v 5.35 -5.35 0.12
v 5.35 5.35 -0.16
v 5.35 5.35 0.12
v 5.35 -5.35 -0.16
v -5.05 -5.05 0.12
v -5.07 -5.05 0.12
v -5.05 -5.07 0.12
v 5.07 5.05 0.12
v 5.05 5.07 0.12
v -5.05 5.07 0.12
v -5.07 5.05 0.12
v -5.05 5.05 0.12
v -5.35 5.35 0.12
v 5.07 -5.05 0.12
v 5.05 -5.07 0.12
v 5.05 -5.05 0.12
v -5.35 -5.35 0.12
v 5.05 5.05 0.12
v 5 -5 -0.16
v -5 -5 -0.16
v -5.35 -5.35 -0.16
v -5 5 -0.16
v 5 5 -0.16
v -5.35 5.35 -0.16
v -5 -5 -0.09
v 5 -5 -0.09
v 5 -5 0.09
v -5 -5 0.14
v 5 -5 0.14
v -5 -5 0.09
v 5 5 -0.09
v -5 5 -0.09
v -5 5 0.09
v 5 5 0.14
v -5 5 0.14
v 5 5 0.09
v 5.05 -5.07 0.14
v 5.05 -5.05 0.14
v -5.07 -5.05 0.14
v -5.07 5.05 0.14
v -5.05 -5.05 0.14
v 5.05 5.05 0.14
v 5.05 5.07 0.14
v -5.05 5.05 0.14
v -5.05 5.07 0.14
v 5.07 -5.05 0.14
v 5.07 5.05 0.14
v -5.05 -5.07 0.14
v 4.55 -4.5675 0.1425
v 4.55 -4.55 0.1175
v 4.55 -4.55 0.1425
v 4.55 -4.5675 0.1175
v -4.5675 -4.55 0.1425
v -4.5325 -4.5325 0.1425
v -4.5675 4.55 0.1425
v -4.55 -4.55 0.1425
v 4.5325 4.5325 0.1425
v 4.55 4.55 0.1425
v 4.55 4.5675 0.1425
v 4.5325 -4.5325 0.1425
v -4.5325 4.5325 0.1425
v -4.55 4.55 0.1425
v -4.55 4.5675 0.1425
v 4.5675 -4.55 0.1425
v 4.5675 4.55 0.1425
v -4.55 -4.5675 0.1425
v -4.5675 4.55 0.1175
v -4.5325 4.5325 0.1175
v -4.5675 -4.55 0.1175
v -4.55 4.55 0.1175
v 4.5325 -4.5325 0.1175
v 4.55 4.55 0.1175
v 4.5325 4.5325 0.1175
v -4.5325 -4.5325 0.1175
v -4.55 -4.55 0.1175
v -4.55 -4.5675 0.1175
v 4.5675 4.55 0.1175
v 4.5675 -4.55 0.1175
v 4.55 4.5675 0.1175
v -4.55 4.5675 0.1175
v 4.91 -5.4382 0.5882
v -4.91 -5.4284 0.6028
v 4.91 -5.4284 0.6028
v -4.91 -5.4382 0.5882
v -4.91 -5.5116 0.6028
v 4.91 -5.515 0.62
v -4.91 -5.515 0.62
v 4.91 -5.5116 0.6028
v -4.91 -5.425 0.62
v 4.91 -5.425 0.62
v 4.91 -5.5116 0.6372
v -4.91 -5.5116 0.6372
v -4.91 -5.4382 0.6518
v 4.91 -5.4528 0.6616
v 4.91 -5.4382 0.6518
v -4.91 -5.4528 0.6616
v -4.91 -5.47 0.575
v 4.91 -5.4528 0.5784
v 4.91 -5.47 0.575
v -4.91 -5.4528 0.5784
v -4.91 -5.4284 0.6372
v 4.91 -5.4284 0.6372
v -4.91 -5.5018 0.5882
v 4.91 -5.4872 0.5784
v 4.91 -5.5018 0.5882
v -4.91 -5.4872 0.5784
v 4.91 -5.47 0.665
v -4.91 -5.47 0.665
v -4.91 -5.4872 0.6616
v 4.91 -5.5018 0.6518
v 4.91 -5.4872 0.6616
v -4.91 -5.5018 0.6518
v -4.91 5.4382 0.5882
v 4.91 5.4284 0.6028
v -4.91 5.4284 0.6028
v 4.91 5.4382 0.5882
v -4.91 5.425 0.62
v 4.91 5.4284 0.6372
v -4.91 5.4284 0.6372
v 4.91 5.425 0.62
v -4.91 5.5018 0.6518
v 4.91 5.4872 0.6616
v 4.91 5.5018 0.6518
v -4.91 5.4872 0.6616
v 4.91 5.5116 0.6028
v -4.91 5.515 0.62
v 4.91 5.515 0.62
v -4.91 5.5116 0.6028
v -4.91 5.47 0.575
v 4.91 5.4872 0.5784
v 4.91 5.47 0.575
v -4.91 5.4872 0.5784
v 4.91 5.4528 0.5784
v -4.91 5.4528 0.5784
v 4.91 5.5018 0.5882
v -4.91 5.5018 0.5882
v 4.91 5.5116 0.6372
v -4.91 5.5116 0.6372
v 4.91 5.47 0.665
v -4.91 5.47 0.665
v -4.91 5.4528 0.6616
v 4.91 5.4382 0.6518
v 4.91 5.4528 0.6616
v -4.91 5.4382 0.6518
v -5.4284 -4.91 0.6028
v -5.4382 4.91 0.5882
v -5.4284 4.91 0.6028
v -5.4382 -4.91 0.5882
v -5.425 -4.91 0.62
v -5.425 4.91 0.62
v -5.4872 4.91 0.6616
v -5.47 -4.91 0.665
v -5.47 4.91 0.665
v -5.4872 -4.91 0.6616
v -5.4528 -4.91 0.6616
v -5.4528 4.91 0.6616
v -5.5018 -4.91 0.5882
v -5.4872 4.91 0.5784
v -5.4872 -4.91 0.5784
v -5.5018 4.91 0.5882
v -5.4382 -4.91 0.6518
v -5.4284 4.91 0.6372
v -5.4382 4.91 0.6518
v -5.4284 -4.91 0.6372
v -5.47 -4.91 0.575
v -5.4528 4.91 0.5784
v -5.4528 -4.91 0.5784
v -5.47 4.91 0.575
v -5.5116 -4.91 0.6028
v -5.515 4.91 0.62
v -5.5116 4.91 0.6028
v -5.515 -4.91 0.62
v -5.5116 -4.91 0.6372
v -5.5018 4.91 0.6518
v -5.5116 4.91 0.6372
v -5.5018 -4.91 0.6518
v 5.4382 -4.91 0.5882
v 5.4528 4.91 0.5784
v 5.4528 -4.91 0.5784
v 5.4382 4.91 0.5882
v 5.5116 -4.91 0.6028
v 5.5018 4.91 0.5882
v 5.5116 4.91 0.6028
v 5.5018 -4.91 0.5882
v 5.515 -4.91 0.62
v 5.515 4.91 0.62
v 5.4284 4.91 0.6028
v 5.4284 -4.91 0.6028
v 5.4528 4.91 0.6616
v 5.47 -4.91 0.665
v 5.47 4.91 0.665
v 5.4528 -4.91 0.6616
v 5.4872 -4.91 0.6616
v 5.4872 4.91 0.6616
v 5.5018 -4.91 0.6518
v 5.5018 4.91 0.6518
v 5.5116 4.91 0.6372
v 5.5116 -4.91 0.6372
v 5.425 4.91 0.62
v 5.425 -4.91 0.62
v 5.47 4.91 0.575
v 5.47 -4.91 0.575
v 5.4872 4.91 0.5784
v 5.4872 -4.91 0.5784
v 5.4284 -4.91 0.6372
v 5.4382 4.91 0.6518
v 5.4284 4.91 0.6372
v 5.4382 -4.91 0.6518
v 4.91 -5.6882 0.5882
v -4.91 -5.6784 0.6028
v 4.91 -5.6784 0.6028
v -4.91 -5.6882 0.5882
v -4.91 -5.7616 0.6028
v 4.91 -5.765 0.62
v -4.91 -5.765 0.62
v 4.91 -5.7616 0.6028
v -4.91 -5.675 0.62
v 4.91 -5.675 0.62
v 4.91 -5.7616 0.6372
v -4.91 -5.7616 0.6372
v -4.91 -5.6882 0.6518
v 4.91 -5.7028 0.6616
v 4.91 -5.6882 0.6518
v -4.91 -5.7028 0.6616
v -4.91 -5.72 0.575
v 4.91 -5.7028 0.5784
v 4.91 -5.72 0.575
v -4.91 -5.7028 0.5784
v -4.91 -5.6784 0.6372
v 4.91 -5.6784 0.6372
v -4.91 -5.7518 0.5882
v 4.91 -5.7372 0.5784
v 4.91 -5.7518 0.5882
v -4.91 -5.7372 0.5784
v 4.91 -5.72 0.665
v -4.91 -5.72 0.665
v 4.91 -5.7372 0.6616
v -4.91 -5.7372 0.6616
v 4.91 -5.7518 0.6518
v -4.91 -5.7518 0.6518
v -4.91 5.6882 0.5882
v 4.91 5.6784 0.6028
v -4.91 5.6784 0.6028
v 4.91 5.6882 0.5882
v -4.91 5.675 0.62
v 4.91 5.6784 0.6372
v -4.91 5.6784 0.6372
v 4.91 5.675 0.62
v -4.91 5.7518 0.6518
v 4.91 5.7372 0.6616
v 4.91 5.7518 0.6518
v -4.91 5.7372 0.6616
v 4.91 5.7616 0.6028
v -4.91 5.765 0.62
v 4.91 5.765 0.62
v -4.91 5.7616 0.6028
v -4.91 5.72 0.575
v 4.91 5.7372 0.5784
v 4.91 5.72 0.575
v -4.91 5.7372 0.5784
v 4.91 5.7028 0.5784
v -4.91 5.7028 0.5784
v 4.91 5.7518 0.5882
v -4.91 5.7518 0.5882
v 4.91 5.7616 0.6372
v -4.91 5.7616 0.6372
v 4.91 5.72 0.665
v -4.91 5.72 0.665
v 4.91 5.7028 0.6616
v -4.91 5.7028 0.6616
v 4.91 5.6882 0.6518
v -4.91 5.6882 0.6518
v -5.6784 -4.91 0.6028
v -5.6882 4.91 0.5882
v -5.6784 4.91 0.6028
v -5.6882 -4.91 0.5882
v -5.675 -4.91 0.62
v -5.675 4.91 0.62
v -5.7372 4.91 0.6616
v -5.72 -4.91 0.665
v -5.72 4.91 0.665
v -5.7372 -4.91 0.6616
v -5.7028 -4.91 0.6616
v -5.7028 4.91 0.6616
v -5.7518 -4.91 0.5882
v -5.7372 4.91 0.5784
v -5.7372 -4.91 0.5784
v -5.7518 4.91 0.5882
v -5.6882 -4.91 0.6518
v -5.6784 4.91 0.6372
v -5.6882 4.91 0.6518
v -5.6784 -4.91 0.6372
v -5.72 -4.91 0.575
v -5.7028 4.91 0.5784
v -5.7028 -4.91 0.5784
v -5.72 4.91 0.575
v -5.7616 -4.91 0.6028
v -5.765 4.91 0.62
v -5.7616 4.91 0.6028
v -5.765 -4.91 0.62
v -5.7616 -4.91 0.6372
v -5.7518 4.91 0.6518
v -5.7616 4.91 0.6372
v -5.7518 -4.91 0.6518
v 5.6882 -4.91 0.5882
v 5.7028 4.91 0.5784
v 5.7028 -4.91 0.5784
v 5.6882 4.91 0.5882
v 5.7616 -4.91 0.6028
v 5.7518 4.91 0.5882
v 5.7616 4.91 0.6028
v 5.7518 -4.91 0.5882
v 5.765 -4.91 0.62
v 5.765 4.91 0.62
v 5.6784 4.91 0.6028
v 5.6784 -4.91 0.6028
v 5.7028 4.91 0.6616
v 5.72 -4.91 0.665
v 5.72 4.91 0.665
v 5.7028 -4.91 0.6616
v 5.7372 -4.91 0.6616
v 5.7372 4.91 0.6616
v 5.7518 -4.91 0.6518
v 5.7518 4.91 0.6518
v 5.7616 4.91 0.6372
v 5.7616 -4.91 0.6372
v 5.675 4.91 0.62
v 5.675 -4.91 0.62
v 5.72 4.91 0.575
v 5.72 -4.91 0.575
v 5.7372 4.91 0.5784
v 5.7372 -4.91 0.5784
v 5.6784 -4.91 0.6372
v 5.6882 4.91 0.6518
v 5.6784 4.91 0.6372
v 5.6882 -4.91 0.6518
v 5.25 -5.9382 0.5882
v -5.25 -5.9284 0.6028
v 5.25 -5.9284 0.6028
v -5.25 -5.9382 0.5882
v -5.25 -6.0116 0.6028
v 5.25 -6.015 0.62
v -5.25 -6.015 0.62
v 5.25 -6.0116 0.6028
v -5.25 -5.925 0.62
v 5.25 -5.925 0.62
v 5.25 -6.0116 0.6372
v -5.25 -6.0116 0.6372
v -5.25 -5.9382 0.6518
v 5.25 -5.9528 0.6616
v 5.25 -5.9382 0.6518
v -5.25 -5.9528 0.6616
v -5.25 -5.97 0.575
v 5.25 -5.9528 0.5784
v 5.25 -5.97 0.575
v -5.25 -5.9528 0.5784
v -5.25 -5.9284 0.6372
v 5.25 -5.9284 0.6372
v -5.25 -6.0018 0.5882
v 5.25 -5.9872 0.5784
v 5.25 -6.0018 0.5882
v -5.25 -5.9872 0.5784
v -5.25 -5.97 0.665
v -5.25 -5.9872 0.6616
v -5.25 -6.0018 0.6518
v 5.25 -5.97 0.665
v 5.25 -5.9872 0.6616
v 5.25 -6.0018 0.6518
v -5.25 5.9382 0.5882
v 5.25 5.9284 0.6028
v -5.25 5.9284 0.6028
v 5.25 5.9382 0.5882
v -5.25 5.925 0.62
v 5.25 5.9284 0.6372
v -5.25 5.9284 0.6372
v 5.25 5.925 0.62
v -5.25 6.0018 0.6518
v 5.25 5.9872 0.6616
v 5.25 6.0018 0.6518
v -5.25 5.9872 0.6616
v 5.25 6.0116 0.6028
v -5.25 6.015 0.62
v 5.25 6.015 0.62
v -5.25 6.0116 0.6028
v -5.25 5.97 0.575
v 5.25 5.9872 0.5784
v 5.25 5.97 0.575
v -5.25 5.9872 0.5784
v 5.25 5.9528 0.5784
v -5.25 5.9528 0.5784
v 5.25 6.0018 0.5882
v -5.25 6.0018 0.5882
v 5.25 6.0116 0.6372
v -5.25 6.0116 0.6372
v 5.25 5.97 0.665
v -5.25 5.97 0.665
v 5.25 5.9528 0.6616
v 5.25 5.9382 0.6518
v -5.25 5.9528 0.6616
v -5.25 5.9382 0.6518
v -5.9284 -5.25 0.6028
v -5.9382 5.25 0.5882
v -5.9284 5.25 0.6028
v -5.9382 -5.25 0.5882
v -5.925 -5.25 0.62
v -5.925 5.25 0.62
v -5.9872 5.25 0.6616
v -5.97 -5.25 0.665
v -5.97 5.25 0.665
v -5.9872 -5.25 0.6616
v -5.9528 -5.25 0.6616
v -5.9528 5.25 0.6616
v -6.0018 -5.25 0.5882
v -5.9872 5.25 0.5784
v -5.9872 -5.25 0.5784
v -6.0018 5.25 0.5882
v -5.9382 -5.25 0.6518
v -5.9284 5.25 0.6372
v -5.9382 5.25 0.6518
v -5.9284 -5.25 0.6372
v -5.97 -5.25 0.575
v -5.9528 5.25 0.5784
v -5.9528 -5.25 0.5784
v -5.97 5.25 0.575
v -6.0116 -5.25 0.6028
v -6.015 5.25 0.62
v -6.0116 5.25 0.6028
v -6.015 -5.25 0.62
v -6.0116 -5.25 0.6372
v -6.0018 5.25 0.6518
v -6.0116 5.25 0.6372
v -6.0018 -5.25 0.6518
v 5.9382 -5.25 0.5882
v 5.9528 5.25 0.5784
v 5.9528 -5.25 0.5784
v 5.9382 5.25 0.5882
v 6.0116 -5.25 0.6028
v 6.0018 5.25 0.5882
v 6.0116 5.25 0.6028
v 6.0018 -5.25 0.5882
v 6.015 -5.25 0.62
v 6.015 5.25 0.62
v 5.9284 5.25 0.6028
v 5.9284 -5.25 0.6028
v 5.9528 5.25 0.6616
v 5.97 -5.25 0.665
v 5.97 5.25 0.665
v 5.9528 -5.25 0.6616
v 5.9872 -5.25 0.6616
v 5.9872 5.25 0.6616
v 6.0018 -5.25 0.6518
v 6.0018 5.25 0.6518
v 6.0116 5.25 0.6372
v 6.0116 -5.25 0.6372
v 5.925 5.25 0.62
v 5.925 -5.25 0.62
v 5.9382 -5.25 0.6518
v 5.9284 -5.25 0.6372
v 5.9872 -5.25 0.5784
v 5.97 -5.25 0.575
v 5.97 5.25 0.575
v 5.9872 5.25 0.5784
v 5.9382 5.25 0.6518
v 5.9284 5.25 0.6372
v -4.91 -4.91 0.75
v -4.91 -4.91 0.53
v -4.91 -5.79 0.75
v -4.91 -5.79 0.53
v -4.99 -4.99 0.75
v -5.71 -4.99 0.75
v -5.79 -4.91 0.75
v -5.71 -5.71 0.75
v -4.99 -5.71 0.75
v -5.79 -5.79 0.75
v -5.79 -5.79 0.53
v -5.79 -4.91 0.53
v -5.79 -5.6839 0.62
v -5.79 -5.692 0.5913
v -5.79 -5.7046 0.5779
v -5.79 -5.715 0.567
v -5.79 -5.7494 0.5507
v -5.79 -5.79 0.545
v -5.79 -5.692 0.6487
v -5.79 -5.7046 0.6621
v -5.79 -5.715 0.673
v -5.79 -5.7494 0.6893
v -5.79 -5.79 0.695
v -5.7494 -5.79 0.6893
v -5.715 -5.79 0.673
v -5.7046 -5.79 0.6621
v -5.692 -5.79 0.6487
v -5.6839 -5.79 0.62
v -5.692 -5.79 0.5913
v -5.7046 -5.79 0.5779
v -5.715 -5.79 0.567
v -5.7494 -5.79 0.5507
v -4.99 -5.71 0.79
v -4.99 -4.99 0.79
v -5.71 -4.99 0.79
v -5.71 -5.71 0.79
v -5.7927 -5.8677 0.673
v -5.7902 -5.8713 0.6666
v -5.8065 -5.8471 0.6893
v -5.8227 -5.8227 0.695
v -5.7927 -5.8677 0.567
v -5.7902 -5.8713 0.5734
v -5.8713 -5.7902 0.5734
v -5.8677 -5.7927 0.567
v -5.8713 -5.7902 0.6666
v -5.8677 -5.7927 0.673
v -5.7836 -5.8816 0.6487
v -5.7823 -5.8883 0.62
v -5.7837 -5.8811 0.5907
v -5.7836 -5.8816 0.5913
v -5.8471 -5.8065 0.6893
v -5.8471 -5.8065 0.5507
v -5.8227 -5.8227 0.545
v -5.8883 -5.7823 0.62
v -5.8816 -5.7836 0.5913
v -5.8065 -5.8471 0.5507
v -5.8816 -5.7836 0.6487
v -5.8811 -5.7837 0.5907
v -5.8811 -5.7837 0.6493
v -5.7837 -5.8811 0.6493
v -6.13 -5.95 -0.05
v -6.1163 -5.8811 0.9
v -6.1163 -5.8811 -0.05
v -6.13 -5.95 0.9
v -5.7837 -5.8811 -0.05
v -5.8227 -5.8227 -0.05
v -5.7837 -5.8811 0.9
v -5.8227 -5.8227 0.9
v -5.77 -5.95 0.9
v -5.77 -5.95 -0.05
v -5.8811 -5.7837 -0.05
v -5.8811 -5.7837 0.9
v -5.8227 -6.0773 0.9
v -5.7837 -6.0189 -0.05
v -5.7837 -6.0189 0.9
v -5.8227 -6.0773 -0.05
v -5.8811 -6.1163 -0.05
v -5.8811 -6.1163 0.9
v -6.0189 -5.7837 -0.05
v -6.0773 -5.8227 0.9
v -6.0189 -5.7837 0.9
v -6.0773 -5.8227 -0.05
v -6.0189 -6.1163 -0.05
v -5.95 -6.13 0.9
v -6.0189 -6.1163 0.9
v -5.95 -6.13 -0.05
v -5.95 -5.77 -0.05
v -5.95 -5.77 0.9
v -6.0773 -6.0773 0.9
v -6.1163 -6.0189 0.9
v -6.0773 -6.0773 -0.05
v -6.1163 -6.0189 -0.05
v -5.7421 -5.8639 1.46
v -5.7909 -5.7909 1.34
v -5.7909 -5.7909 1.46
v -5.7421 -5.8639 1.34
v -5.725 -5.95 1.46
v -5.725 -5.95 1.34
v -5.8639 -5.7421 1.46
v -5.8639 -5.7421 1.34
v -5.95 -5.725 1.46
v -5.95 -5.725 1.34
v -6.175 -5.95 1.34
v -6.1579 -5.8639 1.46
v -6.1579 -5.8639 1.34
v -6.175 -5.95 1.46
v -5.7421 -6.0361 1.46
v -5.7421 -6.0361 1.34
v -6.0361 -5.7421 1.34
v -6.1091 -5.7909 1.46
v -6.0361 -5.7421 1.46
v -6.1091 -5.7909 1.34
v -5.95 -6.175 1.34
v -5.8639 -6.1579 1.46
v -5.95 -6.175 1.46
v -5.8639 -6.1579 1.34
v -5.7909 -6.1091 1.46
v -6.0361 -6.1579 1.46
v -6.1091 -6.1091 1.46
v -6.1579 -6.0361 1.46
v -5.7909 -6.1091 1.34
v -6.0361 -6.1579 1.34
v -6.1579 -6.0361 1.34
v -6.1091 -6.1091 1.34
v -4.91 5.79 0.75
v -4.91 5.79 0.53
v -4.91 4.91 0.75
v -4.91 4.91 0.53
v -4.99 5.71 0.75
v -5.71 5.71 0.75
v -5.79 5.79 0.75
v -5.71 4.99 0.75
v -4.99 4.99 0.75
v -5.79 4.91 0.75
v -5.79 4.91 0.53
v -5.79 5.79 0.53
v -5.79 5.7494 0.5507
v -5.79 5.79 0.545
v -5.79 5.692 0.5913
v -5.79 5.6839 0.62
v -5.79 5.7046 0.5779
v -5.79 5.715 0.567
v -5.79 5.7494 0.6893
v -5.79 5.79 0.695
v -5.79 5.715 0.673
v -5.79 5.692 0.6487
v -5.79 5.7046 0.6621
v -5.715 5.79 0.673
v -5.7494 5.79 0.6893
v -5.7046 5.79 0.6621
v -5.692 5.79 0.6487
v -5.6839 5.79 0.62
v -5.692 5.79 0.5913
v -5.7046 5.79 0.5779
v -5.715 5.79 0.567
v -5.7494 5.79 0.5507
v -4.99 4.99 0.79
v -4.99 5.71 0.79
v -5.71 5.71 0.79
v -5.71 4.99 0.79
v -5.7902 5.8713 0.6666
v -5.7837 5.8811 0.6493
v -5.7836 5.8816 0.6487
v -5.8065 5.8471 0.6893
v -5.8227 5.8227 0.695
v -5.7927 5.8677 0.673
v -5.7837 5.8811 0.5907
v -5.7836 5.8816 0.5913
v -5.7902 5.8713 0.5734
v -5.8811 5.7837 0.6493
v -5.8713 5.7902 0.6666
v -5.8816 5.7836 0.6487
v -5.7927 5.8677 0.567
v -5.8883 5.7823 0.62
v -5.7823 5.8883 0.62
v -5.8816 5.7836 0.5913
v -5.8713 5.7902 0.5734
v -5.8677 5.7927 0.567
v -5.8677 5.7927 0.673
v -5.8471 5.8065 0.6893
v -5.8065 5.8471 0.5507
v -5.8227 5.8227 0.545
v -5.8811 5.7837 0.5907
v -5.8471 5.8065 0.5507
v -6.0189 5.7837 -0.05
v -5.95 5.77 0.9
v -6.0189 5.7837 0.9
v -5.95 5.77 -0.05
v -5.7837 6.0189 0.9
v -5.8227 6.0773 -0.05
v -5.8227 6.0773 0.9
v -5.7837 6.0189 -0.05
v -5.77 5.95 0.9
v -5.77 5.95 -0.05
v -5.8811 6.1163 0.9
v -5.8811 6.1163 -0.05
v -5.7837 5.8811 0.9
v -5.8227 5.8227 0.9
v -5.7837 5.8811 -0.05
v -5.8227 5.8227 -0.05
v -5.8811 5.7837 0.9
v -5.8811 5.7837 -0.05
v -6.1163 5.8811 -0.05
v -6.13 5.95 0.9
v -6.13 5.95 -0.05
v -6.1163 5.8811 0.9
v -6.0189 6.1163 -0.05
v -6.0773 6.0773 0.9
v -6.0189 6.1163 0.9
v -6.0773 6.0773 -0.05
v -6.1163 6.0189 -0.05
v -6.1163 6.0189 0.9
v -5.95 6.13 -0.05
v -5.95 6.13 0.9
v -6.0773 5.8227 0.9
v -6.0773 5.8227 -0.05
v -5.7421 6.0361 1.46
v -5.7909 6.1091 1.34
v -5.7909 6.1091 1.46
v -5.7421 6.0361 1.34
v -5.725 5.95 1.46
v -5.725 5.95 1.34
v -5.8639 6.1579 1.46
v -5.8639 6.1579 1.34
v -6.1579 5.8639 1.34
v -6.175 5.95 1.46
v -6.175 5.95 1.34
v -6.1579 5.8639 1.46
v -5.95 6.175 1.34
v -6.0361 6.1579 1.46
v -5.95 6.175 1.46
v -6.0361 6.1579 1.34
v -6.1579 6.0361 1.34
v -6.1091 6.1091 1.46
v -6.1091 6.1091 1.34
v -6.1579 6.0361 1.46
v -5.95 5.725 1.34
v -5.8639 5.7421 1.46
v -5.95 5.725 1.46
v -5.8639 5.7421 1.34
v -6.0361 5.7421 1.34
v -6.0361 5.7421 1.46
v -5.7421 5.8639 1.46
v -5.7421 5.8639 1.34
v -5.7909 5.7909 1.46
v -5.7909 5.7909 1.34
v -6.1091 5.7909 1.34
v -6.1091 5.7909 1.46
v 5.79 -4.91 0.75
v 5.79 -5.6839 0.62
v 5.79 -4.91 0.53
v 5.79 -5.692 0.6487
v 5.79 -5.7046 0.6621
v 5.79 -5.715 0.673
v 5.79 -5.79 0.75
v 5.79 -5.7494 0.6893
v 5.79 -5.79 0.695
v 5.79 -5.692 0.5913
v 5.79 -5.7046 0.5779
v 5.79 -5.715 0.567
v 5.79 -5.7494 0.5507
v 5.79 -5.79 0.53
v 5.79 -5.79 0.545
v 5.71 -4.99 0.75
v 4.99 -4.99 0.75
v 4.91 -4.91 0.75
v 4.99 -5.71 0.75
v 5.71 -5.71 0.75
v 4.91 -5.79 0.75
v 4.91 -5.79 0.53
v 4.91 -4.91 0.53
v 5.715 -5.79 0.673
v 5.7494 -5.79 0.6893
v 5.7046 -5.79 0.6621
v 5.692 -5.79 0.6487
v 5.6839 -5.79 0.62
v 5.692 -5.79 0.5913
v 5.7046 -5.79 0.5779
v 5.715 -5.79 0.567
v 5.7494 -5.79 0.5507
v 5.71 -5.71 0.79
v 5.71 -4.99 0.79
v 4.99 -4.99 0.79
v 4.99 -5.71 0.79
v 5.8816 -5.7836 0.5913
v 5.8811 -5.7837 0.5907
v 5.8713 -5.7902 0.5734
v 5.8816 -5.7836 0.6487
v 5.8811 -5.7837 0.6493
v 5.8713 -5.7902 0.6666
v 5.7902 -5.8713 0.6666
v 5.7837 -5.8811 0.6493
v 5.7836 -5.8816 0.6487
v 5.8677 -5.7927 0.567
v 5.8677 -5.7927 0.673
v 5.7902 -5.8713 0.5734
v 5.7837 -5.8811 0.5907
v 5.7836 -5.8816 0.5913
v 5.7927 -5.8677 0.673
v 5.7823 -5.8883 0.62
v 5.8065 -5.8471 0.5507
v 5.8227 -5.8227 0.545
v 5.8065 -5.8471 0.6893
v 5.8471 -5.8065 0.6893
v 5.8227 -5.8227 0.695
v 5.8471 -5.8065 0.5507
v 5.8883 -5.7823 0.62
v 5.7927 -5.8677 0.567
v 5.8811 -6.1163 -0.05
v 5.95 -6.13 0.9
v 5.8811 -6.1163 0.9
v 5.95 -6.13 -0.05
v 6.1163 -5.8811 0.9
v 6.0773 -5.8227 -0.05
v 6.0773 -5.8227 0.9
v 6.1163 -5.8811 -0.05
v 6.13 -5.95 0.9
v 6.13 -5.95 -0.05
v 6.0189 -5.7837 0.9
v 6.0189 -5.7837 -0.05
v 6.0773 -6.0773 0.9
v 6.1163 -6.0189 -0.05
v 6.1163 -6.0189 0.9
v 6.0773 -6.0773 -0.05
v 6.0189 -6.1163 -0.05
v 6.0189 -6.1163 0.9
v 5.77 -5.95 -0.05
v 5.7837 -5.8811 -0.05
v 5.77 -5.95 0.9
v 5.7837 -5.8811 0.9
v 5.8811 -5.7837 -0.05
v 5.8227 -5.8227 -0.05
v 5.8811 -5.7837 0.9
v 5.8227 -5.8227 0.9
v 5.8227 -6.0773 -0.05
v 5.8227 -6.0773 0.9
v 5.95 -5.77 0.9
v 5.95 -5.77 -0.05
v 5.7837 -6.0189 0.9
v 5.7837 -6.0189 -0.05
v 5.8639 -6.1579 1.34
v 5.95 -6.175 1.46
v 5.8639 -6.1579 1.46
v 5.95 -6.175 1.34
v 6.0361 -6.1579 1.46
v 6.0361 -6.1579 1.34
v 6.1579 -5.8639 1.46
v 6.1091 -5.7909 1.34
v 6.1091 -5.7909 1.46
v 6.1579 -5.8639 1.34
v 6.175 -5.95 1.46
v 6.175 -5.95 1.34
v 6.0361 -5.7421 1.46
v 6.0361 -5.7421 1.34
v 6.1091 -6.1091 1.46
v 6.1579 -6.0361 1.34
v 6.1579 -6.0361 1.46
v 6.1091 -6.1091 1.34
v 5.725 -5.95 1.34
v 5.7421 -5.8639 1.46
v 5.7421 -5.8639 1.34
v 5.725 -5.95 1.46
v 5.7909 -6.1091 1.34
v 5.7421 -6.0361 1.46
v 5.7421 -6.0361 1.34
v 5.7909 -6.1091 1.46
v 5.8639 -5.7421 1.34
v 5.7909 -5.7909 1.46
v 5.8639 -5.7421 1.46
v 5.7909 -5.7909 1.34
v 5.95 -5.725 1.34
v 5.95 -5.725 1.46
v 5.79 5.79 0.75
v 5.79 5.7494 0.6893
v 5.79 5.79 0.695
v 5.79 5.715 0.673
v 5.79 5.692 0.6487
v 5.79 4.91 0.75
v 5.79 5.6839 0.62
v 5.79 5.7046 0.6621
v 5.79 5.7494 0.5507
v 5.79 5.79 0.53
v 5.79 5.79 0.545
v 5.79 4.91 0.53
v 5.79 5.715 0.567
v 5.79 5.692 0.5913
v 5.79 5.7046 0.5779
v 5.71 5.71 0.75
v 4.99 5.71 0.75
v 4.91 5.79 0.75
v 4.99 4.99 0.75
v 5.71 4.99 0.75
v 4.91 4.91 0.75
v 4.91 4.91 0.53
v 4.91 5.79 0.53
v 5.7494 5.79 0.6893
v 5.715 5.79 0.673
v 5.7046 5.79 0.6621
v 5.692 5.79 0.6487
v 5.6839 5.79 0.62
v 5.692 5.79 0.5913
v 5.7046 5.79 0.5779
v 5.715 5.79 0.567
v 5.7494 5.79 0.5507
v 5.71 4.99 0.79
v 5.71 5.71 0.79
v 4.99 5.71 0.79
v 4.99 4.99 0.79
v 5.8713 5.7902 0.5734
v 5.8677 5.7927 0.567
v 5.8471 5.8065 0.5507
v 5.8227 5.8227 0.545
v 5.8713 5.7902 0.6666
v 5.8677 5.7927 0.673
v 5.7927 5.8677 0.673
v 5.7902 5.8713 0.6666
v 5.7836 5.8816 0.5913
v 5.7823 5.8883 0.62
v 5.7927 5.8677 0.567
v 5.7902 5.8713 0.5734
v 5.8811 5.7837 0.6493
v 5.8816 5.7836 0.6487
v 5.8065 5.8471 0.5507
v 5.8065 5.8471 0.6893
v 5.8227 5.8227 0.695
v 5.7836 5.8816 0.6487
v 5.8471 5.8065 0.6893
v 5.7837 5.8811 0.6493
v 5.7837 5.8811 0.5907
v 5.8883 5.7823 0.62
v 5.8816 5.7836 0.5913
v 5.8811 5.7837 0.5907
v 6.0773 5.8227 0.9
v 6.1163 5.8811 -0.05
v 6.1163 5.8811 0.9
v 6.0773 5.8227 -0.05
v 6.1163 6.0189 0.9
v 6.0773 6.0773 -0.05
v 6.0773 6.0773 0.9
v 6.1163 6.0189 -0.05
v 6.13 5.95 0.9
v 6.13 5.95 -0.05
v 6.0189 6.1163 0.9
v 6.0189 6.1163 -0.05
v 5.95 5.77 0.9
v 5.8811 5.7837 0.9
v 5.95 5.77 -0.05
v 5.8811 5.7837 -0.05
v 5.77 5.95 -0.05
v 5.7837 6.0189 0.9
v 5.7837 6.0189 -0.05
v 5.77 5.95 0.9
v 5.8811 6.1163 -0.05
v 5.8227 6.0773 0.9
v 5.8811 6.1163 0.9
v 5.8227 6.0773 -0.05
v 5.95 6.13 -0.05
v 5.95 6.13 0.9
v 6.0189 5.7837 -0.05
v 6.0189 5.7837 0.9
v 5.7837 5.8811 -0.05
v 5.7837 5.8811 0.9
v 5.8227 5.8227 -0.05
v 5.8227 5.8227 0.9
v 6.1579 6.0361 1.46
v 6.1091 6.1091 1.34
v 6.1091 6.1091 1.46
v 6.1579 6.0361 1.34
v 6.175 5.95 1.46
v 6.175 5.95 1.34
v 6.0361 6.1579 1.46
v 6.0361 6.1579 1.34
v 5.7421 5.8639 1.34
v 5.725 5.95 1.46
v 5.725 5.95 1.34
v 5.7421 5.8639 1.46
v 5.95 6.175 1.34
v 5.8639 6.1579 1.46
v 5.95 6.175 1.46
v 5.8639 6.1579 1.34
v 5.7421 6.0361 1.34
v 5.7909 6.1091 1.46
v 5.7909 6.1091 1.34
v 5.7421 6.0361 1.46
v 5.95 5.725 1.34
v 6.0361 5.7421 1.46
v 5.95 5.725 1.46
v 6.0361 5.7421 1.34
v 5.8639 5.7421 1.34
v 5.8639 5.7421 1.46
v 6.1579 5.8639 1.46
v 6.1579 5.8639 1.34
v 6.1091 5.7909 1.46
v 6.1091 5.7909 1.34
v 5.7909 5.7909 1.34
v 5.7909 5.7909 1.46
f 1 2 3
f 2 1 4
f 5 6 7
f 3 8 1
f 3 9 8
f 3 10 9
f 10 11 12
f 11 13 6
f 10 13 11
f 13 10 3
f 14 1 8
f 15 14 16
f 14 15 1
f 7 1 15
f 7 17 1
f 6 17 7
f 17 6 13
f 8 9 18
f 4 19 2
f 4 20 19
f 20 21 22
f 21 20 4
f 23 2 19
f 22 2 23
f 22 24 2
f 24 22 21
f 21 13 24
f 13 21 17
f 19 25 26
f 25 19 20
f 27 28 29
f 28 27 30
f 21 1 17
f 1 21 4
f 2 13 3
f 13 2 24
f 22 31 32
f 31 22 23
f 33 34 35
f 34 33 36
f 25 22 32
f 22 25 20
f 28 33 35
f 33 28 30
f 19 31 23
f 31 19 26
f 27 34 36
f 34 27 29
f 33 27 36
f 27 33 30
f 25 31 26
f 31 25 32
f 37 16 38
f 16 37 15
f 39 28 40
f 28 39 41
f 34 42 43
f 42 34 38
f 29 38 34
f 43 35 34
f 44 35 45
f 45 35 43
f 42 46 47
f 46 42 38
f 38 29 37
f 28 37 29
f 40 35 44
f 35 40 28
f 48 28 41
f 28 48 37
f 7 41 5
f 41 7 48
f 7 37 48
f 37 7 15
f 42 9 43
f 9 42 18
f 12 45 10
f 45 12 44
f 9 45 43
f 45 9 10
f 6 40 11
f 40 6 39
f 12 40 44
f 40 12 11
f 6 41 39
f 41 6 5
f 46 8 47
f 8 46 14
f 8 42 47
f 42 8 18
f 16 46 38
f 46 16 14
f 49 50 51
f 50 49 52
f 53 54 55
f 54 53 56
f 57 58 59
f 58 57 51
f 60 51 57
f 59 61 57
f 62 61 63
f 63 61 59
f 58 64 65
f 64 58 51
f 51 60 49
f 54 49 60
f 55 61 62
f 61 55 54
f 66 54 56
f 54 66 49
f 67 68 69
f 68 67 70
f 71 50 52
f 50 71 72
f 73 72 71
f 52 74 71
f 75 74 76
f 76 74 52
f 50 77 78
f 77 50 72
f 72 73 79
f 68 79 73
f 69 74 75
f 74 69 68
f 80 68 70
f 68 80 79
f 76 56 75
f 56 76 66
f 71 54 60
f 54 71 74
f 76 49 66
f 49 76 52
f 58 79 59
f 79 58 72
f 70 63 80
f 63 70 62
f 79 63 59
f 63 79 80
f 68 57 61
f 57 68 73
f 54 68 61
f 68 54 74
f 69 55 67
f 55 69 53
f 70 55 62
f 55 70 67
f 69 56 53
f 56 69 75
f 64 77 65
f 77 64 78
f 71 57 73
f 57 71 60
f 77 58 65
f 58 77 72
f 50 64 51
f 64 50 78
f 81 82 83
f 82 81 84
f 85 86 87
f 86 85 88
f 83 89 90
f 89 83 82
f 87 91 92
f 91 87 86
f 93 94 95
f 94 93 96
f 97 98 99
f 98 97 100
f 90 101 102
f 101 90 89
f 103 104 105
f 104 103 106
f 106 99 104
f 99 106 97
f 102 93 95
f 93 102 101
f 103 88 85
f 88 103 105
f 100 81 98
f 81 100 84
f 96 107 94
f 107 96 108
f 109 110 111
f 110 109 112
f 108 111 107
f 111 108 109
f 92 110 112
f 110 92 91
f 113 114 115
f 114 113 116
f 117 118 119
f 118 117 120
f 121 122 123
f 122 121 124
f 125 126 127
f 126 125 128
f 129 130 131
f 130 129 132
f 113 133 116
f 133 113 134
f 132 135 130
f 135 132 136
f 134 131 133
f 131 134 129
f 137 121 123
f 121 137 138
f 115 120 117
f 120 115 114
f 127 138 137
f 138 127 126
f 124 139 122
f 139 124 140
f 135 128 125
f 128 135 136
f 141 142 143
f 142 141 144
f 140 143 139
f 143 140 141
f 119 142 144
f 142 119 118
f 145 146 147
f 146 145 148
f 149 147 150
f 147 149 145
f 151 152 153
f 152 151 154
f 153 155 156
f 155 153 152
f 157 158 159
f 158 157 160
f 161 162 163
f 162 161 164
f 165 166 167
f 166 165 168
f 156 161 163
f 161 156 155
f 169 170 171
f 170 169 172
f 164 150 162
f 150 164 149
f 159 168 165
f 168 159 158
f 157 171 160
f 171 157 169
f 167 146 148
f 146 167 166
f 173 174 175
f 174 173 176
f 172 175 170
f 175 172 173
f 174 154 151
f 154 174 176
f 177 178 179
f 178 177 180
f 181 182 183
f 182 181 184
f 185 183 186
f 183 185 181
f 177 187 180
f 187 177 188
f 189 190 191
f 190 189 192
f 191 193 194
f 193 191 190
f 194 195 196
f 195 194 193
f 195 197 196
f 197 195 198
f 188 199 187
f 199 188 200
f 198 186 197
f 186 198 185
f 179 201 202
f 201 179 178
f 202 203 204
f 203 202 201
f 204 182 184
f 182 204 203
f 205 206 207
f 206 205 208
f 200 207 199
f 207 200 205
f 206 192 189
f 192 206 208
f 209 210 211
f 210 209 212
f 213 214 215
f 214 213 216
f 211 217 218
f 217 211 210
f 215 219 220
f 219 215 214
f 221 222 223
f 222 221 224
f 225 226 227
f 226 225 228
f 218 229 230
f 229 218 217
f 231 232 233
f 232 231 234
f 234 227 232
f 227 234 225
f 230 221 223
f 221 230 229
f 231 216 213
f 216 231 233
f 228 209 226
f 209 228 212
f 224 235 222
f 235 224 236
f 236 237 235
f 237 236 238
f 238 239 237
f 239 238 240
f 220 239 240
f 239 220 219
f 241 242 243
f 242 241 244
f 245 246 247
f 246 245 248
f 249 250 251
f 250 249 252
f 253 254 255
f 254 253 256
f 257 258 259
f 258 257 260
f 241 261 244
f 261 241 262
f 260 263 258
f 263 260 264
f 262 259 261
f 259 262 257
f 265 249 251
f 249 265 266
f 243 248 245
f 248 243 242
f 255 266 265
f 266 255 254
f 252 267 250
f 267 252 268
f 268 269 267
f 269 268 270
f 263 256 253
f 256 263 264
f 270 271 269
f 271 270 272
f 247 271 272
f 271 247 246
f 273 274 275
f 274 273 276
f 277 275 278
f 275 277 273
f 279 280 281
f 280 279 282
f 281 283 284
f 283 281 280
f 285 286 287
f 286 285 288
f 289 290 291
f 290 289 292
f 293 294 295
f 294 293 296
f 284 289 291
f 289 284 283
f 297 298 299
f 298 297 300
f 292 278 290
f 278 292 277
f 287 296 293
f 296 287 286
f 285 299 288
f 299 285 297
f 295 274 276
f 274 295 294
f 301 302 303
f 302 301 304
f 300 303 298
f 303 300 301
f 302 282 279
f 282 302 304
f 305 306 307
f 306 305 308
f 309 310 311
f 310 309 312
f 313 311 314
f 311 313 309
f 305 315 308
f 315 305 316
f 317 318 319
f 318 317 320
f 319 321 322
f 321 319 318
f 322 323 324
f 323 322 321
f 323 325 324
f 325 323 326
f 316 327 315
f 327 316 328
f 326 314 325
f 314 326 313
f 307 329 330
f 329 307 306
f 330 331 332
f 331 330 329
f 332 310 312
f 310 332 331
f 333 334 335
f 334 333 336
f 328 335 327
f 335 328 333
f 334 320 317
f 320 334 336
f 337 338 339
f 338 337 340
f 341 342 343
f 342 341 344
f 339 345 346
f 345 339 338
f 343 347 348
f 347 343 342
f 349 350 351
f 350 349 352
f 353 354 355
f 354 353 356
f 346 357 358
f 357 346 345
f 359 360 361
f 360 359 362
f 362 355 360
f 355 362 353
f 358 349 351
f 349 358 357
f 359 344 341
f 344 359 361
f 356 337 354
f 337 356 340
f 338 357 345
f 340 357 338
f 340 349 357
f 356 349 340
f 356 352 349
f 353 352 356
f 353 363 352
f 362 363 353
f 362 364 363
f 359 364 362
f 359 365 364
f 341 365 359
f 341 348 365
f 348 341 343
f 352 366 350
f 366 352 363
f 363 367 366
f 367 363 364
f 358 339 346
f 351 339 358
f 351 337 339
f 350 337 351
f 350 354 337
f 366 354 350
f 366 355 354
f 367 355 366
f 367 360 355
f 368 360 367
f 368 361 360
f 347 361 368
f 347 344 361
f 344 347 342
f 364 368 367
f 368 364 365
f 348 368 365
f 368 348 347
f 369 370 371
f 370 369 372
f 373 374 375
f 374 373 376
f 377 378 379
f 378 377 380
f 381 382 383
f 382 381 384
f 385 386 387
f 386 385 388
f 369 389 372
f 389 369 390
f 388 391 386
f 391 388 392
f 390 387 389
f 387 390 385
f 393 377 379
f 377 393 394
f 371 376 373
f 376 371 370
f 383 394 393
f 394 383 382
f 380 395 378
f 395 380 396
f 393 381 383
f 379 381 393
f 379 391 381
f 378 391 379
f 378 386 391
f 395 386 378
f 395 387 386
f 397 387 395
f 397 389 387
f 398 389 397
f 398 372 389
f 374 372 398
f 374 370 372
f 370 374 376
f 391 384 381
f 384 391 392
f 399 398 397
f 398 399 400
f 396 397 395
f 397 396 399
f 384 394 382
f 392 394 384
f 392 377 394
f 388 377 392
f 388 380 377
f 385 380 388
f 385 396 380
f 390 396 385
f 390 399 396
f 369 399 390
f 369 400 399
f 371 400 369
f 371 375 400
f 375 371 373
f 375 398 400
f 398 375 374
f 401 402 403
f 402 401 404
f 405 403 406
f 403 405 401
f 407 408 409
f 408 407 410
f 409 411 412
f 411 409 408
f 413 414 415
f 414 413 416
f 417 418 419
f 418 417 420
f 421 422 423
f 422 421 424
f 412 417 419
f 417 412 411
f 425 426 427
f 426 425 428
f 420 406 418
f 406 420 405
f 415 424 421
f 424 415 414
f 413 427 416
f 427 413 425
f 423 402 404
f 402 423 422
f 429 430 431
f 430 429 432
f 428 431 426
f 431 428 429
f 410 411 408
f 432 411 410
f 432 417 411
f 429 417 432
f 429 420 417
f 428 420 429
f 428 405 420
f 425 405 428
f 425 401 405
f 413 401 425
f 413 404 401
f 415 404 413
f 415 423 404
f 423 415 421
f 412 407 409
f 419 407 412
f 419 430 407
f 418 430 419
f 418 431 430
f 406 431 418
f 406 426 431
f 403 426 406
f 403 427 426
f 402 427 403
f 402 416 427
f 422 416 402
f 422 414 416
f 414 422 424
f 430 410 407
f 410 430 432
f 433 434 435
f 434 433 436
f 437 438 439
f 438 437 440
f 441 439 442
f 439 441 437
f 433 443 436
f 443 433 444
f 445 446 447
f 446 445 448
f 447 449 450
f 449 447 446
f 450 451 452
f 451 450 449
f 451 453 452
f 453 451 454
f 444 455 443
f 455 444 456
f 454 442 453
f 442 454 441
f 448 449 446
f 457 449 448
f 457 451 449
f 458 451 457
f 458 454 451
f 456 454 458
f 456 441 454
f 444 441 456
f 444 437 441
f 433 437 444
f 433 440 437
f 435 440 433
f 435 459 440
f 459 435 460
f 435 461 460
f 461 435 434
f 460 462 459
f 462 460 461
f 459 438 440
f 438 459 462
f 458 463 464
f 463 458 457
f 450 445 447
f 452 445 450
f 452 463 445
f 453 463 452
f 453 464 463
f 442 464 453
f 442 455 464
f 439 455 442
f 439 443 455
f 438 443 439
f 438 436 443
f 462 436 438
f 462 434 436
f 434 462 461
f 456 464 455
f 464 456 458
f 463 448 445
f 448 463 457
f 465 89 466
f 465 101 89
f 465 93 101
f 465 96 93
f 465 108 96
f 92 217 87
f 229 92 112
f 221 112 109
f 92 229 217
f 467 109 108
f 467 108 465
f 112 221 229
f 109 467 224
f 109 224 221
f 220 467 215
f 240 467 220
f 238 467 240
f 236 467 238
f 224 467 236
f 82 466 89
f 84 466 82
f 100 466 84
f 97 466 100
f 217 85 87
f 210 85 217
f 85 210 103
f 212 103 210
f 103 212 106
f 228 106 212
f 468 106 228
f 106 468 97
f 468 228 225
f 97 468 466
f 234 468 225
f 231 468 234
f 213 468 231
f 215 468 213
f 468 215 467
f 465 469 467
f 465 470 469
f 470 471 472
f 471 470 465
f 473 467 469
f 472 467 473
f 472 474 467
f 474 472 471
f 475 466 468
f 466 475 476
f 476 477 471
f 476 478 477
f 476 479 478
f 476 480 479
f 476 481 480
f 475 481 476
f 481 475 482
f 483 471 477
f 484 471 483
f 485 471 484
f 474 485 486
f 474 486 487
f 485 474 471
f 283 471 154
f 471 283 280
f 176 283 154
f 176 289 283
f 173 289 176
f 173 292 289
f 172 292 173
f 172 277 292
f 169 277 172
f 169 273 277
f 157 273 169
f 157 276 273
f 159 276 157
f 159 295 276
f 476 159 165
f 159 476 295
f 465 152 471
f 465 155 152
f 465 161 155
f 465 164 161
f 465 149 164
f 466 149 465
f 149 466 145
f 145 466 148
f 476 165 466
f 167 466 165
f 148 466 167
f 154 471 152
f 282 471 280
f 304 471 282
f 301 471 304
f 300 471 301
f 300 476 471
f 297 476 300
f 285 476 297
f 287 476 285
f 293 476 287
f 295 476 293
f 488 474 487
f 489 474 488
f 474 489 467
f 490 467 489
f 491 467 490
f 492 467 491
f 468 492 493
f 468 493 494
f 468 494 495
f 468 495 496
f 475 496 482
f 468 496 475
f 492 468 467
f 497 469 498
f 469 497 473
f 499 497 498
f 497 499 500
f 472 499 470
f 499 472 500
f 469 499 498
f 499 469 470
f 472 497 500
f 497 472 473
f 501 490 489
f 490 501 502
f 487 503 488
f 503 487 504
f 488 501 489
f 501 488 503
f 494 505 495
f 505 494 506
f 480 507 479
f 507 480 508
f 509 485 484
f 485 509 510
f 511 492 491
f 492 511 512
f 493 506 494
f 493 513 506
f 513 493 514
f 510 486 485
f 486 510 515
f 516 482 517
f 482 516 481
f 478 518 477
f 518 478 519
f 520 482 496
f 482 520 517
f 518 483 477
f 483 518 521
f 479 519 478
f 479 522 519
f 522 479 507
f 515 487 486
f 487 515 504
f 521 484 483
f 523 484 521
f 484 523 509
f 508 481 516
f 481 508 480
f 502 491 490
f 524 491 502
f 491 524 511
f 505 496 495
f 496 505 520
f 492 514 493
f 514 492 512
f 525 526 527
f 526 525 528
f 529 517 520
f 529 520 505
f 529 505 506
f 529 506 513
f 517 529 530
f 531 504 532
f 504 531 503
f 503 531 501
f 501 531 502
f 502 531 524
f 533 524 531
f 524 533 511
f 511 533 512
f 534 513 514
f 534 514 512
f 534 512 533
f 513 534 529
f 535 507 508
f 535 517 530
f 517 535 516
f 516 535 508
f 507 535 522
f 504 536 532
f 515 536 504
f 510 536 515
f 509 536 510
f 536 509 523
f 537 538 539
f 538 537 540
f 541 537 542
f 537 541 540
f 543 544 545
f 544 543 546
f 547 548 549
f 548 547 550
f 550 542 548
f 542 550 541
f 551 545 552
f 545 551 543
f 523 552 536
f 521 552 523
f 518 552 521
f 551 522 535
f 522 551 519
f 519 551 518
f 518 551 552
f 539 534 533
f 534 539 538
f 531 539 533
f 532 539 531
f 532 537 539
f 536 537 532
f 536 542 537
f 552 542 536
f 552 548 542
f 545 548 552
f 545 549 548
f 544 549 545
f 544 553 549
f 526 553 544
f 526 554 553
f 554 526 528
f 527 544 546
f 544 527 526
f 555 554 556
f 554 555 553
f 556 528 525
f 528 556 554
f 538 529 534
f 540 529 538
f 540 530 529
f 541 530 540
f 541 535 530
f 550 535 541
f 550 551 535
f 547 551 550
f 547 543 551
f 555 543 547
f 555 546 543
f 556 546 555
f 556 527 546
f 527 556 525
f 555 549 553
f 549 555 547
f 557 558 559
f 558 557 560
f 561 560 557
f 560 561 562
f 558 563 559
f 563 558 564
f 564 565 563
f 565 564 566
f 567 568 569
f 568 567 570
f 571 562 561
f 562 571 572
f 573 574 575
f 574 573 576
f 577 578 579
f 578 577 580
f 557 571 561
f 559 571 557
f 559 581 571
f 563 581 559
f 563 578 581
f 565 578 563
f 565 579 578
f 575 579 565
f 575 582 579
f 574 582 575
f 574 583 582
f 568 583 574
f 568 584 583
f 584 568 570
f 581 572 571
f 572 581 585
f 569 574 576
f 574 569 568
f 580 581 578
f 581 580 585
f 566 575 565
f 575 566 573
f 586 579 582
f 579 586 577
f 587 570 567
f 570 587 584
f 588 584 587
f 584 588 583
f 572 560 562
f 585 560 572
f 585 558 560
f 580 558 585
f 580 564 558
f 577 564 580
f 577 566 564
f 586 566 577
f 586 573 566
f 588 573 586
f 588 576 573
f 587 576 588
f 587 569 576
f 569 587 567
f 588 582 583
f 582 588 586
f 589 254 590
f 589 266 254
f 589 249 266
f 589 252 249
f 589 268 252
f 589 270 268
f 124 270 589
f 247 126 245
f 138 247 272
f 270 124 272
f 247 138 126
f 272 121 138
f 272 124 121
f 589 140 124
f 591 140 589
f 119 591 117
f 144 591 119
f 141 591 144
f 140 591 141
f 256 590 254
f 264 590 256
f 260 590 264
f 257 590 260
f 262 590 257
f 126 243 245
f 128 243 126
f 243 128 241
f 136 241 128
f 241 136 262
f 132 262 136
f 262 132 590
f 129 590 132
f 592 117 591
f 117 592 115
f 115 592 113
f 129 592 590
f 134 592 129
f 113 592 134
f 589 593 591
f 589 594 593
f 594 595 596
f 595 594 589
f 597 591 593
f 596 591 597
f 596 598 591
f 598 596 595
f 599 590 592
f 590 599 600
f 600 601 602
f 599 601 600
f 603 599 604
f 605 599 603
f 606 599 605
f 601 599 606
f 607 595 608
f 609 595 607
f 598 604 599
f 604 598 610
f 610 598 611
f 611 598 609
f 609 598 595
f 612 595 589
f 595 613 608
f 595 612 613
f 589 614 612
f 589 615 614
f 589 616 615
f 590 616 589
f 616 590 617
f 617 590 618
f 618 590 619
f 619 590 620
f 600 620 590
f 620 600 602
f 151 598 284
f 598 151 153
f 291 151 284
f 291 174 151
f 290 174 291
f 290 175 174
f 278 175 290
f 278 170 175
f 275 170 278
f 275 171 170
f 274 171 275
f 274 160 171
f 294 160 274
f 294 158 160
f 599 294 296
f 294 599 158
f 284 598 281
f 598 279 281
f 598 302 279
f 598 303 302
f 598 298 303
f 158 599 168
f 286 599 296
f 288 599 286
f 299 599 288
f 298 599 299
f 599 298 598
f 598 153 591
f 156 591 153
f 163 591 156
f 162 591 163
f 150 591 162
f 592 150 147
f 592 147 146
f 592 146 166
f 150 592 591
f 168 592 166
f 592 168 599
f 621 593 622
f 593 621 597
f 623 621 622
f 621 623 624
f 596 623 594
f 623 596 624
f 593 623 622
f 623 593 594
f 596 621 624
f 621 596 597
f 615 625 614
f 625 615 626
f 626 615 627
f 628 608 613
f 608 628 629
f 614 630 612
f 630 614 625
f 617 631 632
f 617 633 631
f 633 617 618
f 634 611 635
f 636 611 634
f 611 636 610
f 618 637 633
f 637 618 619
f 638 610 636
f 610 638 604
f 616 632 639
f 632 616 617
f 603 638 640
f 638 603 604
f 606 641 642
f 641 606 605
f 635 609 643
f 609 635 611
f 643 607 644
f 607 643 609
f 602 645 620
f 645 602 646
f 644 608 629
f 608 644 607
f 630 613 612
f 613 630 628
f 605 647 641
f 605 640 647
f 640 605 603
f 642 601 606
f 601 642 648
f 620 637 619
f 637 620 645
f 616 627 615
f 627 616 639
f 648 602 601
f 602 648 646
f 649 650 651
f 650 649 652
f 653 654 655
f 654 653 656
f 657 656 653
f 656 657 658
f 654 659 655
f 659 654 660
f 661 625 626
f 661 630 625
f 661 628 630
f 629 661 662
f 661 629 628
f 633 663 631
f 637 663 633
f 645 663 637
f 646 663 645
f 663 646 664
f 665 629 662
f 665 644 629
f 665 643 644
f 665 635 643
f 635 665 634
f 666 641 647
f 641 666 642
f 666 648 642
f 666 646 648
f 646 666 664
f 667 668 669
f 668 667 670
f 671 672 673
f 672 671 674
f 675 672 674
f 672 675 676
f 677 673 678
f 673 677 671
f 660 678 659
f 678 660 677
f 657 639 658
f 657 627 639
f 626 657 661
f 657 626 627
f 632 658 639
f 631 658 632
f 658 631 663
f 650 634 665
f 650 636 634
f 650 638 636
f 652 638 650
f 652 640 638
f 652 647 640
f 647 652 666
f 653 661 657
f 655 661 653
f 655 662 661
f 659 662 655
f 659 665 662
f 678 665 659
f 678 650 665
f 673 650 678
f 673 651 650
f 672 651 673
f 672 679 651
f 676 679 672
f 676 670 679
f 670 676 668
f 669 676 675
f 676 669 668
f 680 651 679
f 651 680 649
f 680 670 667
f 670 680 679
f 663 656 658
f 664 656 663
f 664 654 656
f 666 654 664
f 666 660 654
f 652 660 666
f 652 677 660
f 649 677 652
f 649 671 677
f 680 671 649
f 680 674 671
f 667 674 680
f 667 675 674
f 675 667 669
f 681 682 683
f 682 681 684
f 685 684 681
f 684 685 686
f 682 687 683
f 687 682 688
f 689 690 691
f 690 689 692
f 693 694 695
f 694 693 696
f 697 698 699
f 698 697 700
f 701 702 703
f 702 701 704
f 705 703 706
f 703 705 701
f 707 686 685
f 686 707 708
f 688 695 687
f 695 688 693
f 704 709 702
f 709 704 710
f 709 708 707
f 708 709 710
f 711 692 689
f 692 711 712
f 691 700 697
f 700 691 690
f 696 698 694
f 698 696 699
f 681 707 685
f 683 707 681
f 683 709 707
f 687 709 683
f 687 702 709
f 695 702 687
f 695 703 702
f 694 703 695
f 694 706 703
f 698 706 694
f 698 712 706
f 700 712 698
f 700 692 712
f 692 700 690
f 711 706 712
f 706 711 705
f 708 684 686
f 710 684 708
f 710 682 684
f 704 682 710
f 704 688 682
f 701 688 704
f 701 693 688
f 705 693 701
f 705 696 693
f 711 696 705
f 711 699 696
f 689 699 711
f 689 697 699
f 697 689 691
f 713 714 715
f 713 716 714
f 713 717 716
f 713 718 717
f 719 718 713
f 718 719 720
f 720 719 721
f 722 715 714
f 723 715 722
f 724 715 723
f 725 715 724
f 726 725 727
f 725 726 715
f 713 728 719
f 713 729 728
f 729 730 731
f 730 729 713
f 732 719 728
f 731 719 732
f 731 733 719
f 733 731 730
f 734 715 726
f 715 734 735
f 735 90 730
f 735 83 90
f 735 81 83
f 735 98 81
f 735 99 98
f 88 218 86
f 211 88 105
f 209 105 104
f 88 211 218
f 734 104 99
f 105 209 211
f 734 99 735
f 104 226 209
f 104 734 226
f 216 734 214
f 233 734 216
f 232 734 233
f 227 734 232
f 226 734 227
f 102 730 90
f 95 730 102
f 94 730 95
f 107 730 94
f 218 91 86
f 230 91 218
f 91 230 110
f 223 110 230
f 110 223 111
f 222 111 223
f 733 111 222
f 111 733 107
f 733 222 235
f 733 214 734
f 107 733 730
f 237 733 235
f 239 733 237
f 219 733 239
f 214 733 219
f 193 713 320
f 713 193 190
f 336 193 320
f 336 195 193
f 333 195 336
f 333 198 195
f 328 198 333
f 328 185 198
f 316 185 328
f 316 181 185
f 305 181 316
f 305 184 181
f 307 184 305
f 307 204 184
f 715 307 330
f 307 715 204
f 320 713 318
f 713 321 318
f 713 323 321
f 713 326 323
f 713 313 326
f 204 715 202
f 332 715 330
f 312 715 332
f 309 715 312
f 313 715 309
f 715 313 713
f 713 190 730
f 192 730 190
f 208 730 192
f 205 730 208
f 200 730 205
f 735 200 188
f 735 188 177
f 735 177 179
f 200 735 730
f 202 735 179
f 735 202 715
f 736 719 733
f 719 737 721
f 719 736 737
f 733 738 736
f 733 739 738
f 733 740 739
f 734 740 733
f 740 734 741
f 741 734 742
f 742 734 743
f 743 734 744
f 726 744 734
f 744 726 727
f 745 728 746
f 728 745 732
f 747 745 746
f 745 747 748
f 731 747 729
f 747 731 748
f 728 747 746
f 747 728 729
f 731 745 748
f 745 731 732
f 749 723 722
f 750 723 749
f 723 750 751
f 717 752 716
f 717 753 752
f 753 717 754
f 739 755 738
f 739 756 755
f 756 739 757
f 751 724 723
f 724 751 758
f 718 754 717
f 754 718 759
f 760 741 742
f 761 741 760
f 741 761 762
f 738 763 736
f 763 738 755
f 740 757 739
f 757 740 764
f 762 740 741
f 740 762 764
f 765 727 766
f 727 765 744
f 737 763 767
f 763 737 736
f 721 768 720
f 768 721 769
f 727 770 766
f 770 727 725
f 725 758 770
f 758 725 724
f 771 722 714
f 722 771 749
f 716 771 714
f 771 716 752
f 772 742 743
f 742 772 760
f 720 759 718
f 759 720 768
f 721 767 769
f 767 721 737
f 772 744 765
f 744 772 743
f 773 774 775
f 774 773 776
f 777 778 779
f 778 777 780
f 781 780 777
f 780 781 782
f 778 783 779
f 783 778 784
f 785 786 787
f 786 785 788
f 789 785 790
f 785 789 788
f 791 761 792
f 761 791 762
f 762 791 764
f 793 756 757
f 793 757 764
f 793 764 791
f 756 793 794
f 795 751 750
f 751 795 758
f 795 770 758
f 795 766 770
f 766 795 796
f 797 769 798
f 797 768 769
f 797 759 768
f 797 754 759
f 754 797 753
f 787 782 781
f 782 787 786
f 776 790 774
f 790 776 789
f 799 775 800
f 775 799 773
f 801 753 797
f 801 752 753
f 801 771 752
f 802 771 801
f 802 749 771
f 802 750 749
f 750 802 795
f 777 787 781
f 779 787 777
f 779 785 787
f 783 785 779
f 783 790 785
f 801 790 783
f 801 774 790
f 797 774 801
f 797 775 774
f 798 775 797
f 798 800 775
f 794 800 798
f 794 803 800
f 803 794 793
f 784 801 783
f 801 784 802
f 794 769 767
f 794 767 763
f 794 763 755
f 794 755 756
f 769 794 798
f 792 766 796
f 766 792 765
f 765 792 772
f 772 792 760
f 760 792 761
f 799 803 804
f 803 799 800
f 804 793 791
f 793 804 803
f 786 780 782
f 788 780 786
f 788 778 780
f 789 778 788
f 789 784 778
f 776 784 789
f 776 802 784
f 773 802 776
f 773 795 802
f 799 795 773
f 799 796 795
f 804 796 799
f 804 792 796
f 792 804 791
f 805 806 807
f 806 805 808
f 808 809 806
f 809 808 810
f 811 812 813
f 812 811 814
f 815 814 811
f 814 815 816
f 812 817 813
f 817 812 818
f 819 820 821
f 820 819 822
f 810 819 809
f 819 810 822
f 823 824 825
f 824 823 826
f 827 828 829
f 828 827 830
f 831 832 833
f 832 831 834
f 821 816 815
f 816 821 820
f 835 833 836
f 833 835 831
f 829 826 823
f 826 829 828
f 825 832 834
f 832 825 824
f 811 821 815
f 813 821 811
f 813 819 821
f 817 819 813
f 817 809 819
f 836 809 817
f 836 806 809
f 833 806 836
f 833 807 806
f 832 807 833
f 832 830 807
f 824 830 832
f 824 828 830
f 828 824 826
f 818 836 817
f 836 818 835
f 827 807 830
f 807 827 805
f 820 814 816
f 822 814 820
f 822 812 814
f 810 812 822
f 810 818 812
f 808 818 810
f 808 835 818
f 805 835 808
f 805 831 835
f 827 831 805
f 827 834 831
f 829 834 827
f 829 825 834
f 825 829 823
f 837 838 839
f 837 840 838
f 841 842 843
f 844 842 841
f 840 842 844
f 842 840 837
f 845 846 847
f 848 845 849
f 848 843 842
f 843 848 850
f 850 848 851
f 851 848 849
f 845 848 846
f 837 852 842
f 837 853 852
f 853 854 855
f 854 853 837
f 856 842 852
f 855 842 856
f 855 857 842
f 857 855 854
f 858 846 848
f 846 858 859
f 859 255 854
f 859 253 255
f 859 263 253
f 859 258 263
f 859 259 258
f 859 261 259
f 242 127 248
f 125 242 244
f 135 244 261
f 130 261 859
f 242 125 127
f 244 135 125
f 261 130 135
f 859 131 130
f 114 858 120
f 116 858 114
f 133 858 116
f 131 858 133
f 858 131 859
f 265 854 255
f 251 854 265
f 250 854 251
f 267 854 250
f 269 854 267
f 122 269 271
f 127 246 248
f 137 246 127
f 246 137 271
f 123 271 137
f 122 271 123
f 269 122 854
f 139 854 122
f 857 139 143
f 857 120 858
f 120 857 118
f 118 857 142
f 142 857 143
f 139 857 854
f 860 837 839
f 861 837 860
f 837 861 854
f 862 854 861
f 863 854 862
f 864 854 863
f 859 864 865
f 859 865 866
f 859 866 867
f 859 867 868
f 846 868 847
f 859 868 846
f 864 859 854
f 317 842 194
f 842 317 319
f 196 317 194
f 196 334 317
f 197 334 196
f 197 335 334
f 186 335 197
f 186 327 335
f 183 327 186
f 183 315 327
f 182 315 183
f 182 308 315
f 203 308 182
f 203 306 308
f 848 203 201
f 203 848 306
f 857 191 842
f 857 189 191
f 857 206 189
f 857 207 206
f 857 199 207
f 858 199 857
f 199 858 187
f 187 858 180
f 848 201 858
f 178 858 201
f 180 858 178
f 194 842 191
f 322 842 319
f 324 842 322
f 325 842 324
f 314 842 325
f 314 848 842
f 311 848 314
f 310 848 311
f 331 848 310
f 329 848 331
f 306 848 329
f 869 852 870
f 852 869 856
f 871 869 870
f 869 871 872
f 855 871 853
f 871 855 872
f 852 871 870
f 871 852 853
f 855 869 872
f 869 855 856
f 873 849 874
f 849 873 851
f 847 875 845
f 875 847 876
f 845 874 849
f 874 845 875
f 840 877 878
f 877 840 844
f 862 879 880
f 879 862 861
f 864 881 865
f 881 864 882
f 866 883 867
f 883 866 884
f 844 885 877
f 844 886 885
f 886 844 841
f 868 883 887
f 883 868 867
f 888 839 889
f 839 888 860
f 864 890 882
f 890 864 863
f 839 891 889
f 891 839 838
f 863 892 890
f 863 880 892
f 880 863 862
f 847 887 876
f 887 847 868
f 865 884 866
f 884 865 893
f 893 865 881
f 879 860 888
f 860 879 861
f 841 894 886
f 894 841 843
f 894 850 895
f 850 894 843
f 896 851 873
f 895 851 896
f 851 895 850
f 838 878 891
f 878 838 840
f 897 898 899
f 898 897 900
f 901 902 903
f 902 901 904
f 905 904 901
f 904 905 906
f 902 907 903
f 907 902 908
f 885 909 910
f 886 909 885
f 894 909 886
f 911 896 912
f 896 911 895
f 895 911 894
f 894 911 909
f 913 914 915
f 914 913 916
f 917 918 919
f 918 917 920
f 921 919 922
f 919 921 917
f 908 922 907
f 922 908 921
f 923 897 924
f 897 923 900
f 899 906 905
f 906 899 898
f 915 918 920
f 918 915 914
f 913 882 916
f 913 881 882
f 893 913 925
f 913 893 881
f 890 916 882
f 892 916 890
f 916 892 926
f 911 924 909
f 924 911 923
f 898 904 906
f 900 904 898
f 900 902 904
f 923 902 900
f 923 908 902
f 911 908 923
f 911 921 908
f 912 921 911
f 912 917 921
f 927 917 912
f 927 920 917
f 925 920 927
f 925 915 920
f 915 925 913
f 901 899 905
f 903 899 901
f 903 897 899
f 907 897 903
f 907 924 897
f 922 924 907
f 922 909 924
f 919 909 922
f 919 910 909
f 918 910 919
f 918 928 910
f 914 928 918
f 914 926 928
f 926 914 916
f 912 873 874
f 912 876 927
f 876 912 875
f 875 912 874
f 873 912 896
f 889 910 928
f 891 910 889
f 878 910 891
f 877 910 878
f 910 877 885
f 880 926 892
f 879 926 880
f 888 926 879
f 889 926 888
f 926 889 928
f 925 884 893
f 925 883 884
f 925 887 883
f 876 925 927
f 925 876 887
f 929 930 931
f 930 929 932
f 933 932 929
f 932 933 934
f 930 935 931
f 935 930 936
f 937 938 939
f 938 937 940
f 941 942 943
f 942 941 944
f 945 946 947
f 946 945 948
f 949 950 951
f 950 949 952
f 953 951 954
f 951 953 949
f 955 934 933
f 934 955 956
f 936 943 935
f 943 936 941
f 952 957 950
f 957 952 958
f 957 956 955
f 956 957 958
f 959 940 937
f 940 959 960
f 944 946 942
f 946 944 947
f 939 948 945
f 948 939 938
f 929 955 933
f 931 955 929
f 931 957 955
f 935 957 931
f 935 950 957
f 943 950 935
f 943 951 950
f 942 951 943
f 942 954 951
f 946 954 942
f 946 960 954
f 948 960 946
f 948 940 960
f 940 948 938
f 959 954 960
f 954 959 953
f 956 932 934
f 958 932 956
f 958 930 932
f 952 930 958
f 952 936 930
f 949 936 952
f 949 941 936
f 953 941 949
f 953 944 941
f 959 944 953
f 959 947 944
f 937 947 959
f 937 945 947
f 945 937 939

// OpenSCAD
// Low Poly Top Down Wrestling Ring
// Source of truth for the prototype ring asset.
// Units are arbitrary game units.

$fn = 16;

ring_size = 10;
mat_thickness = 0.18;
mat_z = 0;

apron_width = 0.35;
apron_height = 0.28;

rope_count = 3;
rope_radius = 0.045;
rope_spacing = 0.25;
rope_height = 0.62;
rope_offset_from_mat = 0.47;

post_radius = 0.18;
post_height = 0.95;
post_offset = 0.95;
post_cap_height = 0.12;

corner_pad_size = 0.72;
corner_pad_height = 0.22;
corner_pad_z = 0.68;
corner_pad_backing_size = 0.88;
corner_connector_radius = 0.075;

black = [0, 0, 0];
white = [1, 1, 1];

module box_at(pos, size, col) {
  color(col)
    translate(pos)
      cube(size, center = true);
}

module cyl_between(p1, p2, r, col) {
  v = [p2[0] - p1[0], p2[1] - p1[1], p2[2] - p1[2]];
  length = norm(v);
  axis = cross([0, 0, 1], v);
  angle = acos(v[2] / length);

  color(col)
    translate(p1)
      rotate(a = angle, v = axis)
        cylinder(h = length, r = r, center = false);
}

module mat() {
  box_at([0, 0, mat_z], [ring_size, ring_size, mat_thickness], white);

  // black edge lines
  edge = ring_size / 2 + 0.035;
  box_at([0, -edge, mat_z + 0.12], [ring_size + 0.1, 0.07, 0.04], black);
  box_at([0, edge, mat_z + 0.12], [ring_size + 0.1, 0.07, 0.04], black);
  box_at([-edge, 0, mat_z + 0.12], [0.07, ring_size + 0.1, 0.04], black);
  box_at([edge, 0, mat_z + 0.12], [0.07, ring_size + 0.1, 0.04], black);

  // inner sheet line for top down readability
  inner = ring_size / 2 - 0.45;
  box_at([0, -inner, mat_z + 0.13], [inner * 2, 0.035, 0.025], black);
  box_at([0, inner, mat_z + 0.13], [inner * 2, 0.035, 0.025], black);
  box_at([-inner, 0, mat_z + 0.13], [0.035, inner * 2, 0.025], black);
  box_at([inner, 0, mat_z + 0.13], [0.035, inner * 2, 0.025], black);
}

module apron() {
  outer = ring_size / 2 + apron_width / 2;
  box_at([0, -outer, -0.02], [ring_size + apron_width * 2, apron_width, apron_height], black);
  box_at([0, outer, -0.02], [ring_size + apron_width * 2, apron_width, apron_height], black);
  box_at([-outer, 0, -0.02], [apron_width, ring_size + apron_width * 2, apron_height], black);
  box_at([outer, 0, -0.02], [apron_width, ring_size + apron_width * 2, apron_height], black);
}

module ropes() {
  rope_edge = ring_size / 2 + rope_offset_from_mat;
  rope_start = -ring_size / 2 - 0.25;
  rope_end = ring_size / 2 + 0.25;

  for (i = [0 : rope_count - 1]) {
    offset = i * rope_spacing;

    cyl_between([rope_start, -rope_edge - offset, rope_height], [rope_end, -rope_edge - offset, rope_height], rope_radius, black);
    cyl_between([rope_start, rope_edge + offset, rope_height], [rope_end, rope_edge + offset, rope_height], rope_radius, black);

    cyl_between([-rope_edge - offset, rope_start, rope_height], [-rope_edge - offset, rope_end, rope_height], rope_radius, black);
    cyl_between([rope_edge + offset, rope_start, rope_height], [rope_edge + offset, rope_end, rope_height], rope_radius, black);
  }
}

module corner_pad(x_sign, y_sign) {
  cx = x_sign * (ring_size / 2 + 0.35);
  cy = y_sign * (ring_size / 2 + 0.35);

  // black backing creates visible outline from top down
  box_at([cx, cy, corner_pad_z - 0.04], [corner_pad_backing_size, corner_pad_backing_size, corner_pad_height], black);
  box_at([cx, cy, corner_pad_z], [corner_pad_size, corner_pad_size, corner_pad_height], white);

  // diagonal support arm to outer post
  post_x = x_sign * (ring_size / 2 + post_offset);
  post_y = y_sign * (ring_size / 2 + post_offset);
  cyl_between([cx + x_sign * 0.15, cy + y_sign * 0.15, rope_height], [post_x, post_y, rope_height], corner_connector_radius, black);

  // post and cap
  color(black)
    translate([post_x, post_y, post_height / 2 - 0.05])
      cylinder(h = post_height, r = post_radius, center = true);

  color(black)
    translate([post_x, post_y, post_height + 0.45])
      cylinder(h = post_cap_height, r = post_radius * 1.25, center = true);
}

module ring() {
  apron();
  mat();
  ropes();

  for (sx = [-1, 1]) {
    for (sy = [-1, 1]) {
      corner_pad(sx, sy);
    }
  }
}

ring();
